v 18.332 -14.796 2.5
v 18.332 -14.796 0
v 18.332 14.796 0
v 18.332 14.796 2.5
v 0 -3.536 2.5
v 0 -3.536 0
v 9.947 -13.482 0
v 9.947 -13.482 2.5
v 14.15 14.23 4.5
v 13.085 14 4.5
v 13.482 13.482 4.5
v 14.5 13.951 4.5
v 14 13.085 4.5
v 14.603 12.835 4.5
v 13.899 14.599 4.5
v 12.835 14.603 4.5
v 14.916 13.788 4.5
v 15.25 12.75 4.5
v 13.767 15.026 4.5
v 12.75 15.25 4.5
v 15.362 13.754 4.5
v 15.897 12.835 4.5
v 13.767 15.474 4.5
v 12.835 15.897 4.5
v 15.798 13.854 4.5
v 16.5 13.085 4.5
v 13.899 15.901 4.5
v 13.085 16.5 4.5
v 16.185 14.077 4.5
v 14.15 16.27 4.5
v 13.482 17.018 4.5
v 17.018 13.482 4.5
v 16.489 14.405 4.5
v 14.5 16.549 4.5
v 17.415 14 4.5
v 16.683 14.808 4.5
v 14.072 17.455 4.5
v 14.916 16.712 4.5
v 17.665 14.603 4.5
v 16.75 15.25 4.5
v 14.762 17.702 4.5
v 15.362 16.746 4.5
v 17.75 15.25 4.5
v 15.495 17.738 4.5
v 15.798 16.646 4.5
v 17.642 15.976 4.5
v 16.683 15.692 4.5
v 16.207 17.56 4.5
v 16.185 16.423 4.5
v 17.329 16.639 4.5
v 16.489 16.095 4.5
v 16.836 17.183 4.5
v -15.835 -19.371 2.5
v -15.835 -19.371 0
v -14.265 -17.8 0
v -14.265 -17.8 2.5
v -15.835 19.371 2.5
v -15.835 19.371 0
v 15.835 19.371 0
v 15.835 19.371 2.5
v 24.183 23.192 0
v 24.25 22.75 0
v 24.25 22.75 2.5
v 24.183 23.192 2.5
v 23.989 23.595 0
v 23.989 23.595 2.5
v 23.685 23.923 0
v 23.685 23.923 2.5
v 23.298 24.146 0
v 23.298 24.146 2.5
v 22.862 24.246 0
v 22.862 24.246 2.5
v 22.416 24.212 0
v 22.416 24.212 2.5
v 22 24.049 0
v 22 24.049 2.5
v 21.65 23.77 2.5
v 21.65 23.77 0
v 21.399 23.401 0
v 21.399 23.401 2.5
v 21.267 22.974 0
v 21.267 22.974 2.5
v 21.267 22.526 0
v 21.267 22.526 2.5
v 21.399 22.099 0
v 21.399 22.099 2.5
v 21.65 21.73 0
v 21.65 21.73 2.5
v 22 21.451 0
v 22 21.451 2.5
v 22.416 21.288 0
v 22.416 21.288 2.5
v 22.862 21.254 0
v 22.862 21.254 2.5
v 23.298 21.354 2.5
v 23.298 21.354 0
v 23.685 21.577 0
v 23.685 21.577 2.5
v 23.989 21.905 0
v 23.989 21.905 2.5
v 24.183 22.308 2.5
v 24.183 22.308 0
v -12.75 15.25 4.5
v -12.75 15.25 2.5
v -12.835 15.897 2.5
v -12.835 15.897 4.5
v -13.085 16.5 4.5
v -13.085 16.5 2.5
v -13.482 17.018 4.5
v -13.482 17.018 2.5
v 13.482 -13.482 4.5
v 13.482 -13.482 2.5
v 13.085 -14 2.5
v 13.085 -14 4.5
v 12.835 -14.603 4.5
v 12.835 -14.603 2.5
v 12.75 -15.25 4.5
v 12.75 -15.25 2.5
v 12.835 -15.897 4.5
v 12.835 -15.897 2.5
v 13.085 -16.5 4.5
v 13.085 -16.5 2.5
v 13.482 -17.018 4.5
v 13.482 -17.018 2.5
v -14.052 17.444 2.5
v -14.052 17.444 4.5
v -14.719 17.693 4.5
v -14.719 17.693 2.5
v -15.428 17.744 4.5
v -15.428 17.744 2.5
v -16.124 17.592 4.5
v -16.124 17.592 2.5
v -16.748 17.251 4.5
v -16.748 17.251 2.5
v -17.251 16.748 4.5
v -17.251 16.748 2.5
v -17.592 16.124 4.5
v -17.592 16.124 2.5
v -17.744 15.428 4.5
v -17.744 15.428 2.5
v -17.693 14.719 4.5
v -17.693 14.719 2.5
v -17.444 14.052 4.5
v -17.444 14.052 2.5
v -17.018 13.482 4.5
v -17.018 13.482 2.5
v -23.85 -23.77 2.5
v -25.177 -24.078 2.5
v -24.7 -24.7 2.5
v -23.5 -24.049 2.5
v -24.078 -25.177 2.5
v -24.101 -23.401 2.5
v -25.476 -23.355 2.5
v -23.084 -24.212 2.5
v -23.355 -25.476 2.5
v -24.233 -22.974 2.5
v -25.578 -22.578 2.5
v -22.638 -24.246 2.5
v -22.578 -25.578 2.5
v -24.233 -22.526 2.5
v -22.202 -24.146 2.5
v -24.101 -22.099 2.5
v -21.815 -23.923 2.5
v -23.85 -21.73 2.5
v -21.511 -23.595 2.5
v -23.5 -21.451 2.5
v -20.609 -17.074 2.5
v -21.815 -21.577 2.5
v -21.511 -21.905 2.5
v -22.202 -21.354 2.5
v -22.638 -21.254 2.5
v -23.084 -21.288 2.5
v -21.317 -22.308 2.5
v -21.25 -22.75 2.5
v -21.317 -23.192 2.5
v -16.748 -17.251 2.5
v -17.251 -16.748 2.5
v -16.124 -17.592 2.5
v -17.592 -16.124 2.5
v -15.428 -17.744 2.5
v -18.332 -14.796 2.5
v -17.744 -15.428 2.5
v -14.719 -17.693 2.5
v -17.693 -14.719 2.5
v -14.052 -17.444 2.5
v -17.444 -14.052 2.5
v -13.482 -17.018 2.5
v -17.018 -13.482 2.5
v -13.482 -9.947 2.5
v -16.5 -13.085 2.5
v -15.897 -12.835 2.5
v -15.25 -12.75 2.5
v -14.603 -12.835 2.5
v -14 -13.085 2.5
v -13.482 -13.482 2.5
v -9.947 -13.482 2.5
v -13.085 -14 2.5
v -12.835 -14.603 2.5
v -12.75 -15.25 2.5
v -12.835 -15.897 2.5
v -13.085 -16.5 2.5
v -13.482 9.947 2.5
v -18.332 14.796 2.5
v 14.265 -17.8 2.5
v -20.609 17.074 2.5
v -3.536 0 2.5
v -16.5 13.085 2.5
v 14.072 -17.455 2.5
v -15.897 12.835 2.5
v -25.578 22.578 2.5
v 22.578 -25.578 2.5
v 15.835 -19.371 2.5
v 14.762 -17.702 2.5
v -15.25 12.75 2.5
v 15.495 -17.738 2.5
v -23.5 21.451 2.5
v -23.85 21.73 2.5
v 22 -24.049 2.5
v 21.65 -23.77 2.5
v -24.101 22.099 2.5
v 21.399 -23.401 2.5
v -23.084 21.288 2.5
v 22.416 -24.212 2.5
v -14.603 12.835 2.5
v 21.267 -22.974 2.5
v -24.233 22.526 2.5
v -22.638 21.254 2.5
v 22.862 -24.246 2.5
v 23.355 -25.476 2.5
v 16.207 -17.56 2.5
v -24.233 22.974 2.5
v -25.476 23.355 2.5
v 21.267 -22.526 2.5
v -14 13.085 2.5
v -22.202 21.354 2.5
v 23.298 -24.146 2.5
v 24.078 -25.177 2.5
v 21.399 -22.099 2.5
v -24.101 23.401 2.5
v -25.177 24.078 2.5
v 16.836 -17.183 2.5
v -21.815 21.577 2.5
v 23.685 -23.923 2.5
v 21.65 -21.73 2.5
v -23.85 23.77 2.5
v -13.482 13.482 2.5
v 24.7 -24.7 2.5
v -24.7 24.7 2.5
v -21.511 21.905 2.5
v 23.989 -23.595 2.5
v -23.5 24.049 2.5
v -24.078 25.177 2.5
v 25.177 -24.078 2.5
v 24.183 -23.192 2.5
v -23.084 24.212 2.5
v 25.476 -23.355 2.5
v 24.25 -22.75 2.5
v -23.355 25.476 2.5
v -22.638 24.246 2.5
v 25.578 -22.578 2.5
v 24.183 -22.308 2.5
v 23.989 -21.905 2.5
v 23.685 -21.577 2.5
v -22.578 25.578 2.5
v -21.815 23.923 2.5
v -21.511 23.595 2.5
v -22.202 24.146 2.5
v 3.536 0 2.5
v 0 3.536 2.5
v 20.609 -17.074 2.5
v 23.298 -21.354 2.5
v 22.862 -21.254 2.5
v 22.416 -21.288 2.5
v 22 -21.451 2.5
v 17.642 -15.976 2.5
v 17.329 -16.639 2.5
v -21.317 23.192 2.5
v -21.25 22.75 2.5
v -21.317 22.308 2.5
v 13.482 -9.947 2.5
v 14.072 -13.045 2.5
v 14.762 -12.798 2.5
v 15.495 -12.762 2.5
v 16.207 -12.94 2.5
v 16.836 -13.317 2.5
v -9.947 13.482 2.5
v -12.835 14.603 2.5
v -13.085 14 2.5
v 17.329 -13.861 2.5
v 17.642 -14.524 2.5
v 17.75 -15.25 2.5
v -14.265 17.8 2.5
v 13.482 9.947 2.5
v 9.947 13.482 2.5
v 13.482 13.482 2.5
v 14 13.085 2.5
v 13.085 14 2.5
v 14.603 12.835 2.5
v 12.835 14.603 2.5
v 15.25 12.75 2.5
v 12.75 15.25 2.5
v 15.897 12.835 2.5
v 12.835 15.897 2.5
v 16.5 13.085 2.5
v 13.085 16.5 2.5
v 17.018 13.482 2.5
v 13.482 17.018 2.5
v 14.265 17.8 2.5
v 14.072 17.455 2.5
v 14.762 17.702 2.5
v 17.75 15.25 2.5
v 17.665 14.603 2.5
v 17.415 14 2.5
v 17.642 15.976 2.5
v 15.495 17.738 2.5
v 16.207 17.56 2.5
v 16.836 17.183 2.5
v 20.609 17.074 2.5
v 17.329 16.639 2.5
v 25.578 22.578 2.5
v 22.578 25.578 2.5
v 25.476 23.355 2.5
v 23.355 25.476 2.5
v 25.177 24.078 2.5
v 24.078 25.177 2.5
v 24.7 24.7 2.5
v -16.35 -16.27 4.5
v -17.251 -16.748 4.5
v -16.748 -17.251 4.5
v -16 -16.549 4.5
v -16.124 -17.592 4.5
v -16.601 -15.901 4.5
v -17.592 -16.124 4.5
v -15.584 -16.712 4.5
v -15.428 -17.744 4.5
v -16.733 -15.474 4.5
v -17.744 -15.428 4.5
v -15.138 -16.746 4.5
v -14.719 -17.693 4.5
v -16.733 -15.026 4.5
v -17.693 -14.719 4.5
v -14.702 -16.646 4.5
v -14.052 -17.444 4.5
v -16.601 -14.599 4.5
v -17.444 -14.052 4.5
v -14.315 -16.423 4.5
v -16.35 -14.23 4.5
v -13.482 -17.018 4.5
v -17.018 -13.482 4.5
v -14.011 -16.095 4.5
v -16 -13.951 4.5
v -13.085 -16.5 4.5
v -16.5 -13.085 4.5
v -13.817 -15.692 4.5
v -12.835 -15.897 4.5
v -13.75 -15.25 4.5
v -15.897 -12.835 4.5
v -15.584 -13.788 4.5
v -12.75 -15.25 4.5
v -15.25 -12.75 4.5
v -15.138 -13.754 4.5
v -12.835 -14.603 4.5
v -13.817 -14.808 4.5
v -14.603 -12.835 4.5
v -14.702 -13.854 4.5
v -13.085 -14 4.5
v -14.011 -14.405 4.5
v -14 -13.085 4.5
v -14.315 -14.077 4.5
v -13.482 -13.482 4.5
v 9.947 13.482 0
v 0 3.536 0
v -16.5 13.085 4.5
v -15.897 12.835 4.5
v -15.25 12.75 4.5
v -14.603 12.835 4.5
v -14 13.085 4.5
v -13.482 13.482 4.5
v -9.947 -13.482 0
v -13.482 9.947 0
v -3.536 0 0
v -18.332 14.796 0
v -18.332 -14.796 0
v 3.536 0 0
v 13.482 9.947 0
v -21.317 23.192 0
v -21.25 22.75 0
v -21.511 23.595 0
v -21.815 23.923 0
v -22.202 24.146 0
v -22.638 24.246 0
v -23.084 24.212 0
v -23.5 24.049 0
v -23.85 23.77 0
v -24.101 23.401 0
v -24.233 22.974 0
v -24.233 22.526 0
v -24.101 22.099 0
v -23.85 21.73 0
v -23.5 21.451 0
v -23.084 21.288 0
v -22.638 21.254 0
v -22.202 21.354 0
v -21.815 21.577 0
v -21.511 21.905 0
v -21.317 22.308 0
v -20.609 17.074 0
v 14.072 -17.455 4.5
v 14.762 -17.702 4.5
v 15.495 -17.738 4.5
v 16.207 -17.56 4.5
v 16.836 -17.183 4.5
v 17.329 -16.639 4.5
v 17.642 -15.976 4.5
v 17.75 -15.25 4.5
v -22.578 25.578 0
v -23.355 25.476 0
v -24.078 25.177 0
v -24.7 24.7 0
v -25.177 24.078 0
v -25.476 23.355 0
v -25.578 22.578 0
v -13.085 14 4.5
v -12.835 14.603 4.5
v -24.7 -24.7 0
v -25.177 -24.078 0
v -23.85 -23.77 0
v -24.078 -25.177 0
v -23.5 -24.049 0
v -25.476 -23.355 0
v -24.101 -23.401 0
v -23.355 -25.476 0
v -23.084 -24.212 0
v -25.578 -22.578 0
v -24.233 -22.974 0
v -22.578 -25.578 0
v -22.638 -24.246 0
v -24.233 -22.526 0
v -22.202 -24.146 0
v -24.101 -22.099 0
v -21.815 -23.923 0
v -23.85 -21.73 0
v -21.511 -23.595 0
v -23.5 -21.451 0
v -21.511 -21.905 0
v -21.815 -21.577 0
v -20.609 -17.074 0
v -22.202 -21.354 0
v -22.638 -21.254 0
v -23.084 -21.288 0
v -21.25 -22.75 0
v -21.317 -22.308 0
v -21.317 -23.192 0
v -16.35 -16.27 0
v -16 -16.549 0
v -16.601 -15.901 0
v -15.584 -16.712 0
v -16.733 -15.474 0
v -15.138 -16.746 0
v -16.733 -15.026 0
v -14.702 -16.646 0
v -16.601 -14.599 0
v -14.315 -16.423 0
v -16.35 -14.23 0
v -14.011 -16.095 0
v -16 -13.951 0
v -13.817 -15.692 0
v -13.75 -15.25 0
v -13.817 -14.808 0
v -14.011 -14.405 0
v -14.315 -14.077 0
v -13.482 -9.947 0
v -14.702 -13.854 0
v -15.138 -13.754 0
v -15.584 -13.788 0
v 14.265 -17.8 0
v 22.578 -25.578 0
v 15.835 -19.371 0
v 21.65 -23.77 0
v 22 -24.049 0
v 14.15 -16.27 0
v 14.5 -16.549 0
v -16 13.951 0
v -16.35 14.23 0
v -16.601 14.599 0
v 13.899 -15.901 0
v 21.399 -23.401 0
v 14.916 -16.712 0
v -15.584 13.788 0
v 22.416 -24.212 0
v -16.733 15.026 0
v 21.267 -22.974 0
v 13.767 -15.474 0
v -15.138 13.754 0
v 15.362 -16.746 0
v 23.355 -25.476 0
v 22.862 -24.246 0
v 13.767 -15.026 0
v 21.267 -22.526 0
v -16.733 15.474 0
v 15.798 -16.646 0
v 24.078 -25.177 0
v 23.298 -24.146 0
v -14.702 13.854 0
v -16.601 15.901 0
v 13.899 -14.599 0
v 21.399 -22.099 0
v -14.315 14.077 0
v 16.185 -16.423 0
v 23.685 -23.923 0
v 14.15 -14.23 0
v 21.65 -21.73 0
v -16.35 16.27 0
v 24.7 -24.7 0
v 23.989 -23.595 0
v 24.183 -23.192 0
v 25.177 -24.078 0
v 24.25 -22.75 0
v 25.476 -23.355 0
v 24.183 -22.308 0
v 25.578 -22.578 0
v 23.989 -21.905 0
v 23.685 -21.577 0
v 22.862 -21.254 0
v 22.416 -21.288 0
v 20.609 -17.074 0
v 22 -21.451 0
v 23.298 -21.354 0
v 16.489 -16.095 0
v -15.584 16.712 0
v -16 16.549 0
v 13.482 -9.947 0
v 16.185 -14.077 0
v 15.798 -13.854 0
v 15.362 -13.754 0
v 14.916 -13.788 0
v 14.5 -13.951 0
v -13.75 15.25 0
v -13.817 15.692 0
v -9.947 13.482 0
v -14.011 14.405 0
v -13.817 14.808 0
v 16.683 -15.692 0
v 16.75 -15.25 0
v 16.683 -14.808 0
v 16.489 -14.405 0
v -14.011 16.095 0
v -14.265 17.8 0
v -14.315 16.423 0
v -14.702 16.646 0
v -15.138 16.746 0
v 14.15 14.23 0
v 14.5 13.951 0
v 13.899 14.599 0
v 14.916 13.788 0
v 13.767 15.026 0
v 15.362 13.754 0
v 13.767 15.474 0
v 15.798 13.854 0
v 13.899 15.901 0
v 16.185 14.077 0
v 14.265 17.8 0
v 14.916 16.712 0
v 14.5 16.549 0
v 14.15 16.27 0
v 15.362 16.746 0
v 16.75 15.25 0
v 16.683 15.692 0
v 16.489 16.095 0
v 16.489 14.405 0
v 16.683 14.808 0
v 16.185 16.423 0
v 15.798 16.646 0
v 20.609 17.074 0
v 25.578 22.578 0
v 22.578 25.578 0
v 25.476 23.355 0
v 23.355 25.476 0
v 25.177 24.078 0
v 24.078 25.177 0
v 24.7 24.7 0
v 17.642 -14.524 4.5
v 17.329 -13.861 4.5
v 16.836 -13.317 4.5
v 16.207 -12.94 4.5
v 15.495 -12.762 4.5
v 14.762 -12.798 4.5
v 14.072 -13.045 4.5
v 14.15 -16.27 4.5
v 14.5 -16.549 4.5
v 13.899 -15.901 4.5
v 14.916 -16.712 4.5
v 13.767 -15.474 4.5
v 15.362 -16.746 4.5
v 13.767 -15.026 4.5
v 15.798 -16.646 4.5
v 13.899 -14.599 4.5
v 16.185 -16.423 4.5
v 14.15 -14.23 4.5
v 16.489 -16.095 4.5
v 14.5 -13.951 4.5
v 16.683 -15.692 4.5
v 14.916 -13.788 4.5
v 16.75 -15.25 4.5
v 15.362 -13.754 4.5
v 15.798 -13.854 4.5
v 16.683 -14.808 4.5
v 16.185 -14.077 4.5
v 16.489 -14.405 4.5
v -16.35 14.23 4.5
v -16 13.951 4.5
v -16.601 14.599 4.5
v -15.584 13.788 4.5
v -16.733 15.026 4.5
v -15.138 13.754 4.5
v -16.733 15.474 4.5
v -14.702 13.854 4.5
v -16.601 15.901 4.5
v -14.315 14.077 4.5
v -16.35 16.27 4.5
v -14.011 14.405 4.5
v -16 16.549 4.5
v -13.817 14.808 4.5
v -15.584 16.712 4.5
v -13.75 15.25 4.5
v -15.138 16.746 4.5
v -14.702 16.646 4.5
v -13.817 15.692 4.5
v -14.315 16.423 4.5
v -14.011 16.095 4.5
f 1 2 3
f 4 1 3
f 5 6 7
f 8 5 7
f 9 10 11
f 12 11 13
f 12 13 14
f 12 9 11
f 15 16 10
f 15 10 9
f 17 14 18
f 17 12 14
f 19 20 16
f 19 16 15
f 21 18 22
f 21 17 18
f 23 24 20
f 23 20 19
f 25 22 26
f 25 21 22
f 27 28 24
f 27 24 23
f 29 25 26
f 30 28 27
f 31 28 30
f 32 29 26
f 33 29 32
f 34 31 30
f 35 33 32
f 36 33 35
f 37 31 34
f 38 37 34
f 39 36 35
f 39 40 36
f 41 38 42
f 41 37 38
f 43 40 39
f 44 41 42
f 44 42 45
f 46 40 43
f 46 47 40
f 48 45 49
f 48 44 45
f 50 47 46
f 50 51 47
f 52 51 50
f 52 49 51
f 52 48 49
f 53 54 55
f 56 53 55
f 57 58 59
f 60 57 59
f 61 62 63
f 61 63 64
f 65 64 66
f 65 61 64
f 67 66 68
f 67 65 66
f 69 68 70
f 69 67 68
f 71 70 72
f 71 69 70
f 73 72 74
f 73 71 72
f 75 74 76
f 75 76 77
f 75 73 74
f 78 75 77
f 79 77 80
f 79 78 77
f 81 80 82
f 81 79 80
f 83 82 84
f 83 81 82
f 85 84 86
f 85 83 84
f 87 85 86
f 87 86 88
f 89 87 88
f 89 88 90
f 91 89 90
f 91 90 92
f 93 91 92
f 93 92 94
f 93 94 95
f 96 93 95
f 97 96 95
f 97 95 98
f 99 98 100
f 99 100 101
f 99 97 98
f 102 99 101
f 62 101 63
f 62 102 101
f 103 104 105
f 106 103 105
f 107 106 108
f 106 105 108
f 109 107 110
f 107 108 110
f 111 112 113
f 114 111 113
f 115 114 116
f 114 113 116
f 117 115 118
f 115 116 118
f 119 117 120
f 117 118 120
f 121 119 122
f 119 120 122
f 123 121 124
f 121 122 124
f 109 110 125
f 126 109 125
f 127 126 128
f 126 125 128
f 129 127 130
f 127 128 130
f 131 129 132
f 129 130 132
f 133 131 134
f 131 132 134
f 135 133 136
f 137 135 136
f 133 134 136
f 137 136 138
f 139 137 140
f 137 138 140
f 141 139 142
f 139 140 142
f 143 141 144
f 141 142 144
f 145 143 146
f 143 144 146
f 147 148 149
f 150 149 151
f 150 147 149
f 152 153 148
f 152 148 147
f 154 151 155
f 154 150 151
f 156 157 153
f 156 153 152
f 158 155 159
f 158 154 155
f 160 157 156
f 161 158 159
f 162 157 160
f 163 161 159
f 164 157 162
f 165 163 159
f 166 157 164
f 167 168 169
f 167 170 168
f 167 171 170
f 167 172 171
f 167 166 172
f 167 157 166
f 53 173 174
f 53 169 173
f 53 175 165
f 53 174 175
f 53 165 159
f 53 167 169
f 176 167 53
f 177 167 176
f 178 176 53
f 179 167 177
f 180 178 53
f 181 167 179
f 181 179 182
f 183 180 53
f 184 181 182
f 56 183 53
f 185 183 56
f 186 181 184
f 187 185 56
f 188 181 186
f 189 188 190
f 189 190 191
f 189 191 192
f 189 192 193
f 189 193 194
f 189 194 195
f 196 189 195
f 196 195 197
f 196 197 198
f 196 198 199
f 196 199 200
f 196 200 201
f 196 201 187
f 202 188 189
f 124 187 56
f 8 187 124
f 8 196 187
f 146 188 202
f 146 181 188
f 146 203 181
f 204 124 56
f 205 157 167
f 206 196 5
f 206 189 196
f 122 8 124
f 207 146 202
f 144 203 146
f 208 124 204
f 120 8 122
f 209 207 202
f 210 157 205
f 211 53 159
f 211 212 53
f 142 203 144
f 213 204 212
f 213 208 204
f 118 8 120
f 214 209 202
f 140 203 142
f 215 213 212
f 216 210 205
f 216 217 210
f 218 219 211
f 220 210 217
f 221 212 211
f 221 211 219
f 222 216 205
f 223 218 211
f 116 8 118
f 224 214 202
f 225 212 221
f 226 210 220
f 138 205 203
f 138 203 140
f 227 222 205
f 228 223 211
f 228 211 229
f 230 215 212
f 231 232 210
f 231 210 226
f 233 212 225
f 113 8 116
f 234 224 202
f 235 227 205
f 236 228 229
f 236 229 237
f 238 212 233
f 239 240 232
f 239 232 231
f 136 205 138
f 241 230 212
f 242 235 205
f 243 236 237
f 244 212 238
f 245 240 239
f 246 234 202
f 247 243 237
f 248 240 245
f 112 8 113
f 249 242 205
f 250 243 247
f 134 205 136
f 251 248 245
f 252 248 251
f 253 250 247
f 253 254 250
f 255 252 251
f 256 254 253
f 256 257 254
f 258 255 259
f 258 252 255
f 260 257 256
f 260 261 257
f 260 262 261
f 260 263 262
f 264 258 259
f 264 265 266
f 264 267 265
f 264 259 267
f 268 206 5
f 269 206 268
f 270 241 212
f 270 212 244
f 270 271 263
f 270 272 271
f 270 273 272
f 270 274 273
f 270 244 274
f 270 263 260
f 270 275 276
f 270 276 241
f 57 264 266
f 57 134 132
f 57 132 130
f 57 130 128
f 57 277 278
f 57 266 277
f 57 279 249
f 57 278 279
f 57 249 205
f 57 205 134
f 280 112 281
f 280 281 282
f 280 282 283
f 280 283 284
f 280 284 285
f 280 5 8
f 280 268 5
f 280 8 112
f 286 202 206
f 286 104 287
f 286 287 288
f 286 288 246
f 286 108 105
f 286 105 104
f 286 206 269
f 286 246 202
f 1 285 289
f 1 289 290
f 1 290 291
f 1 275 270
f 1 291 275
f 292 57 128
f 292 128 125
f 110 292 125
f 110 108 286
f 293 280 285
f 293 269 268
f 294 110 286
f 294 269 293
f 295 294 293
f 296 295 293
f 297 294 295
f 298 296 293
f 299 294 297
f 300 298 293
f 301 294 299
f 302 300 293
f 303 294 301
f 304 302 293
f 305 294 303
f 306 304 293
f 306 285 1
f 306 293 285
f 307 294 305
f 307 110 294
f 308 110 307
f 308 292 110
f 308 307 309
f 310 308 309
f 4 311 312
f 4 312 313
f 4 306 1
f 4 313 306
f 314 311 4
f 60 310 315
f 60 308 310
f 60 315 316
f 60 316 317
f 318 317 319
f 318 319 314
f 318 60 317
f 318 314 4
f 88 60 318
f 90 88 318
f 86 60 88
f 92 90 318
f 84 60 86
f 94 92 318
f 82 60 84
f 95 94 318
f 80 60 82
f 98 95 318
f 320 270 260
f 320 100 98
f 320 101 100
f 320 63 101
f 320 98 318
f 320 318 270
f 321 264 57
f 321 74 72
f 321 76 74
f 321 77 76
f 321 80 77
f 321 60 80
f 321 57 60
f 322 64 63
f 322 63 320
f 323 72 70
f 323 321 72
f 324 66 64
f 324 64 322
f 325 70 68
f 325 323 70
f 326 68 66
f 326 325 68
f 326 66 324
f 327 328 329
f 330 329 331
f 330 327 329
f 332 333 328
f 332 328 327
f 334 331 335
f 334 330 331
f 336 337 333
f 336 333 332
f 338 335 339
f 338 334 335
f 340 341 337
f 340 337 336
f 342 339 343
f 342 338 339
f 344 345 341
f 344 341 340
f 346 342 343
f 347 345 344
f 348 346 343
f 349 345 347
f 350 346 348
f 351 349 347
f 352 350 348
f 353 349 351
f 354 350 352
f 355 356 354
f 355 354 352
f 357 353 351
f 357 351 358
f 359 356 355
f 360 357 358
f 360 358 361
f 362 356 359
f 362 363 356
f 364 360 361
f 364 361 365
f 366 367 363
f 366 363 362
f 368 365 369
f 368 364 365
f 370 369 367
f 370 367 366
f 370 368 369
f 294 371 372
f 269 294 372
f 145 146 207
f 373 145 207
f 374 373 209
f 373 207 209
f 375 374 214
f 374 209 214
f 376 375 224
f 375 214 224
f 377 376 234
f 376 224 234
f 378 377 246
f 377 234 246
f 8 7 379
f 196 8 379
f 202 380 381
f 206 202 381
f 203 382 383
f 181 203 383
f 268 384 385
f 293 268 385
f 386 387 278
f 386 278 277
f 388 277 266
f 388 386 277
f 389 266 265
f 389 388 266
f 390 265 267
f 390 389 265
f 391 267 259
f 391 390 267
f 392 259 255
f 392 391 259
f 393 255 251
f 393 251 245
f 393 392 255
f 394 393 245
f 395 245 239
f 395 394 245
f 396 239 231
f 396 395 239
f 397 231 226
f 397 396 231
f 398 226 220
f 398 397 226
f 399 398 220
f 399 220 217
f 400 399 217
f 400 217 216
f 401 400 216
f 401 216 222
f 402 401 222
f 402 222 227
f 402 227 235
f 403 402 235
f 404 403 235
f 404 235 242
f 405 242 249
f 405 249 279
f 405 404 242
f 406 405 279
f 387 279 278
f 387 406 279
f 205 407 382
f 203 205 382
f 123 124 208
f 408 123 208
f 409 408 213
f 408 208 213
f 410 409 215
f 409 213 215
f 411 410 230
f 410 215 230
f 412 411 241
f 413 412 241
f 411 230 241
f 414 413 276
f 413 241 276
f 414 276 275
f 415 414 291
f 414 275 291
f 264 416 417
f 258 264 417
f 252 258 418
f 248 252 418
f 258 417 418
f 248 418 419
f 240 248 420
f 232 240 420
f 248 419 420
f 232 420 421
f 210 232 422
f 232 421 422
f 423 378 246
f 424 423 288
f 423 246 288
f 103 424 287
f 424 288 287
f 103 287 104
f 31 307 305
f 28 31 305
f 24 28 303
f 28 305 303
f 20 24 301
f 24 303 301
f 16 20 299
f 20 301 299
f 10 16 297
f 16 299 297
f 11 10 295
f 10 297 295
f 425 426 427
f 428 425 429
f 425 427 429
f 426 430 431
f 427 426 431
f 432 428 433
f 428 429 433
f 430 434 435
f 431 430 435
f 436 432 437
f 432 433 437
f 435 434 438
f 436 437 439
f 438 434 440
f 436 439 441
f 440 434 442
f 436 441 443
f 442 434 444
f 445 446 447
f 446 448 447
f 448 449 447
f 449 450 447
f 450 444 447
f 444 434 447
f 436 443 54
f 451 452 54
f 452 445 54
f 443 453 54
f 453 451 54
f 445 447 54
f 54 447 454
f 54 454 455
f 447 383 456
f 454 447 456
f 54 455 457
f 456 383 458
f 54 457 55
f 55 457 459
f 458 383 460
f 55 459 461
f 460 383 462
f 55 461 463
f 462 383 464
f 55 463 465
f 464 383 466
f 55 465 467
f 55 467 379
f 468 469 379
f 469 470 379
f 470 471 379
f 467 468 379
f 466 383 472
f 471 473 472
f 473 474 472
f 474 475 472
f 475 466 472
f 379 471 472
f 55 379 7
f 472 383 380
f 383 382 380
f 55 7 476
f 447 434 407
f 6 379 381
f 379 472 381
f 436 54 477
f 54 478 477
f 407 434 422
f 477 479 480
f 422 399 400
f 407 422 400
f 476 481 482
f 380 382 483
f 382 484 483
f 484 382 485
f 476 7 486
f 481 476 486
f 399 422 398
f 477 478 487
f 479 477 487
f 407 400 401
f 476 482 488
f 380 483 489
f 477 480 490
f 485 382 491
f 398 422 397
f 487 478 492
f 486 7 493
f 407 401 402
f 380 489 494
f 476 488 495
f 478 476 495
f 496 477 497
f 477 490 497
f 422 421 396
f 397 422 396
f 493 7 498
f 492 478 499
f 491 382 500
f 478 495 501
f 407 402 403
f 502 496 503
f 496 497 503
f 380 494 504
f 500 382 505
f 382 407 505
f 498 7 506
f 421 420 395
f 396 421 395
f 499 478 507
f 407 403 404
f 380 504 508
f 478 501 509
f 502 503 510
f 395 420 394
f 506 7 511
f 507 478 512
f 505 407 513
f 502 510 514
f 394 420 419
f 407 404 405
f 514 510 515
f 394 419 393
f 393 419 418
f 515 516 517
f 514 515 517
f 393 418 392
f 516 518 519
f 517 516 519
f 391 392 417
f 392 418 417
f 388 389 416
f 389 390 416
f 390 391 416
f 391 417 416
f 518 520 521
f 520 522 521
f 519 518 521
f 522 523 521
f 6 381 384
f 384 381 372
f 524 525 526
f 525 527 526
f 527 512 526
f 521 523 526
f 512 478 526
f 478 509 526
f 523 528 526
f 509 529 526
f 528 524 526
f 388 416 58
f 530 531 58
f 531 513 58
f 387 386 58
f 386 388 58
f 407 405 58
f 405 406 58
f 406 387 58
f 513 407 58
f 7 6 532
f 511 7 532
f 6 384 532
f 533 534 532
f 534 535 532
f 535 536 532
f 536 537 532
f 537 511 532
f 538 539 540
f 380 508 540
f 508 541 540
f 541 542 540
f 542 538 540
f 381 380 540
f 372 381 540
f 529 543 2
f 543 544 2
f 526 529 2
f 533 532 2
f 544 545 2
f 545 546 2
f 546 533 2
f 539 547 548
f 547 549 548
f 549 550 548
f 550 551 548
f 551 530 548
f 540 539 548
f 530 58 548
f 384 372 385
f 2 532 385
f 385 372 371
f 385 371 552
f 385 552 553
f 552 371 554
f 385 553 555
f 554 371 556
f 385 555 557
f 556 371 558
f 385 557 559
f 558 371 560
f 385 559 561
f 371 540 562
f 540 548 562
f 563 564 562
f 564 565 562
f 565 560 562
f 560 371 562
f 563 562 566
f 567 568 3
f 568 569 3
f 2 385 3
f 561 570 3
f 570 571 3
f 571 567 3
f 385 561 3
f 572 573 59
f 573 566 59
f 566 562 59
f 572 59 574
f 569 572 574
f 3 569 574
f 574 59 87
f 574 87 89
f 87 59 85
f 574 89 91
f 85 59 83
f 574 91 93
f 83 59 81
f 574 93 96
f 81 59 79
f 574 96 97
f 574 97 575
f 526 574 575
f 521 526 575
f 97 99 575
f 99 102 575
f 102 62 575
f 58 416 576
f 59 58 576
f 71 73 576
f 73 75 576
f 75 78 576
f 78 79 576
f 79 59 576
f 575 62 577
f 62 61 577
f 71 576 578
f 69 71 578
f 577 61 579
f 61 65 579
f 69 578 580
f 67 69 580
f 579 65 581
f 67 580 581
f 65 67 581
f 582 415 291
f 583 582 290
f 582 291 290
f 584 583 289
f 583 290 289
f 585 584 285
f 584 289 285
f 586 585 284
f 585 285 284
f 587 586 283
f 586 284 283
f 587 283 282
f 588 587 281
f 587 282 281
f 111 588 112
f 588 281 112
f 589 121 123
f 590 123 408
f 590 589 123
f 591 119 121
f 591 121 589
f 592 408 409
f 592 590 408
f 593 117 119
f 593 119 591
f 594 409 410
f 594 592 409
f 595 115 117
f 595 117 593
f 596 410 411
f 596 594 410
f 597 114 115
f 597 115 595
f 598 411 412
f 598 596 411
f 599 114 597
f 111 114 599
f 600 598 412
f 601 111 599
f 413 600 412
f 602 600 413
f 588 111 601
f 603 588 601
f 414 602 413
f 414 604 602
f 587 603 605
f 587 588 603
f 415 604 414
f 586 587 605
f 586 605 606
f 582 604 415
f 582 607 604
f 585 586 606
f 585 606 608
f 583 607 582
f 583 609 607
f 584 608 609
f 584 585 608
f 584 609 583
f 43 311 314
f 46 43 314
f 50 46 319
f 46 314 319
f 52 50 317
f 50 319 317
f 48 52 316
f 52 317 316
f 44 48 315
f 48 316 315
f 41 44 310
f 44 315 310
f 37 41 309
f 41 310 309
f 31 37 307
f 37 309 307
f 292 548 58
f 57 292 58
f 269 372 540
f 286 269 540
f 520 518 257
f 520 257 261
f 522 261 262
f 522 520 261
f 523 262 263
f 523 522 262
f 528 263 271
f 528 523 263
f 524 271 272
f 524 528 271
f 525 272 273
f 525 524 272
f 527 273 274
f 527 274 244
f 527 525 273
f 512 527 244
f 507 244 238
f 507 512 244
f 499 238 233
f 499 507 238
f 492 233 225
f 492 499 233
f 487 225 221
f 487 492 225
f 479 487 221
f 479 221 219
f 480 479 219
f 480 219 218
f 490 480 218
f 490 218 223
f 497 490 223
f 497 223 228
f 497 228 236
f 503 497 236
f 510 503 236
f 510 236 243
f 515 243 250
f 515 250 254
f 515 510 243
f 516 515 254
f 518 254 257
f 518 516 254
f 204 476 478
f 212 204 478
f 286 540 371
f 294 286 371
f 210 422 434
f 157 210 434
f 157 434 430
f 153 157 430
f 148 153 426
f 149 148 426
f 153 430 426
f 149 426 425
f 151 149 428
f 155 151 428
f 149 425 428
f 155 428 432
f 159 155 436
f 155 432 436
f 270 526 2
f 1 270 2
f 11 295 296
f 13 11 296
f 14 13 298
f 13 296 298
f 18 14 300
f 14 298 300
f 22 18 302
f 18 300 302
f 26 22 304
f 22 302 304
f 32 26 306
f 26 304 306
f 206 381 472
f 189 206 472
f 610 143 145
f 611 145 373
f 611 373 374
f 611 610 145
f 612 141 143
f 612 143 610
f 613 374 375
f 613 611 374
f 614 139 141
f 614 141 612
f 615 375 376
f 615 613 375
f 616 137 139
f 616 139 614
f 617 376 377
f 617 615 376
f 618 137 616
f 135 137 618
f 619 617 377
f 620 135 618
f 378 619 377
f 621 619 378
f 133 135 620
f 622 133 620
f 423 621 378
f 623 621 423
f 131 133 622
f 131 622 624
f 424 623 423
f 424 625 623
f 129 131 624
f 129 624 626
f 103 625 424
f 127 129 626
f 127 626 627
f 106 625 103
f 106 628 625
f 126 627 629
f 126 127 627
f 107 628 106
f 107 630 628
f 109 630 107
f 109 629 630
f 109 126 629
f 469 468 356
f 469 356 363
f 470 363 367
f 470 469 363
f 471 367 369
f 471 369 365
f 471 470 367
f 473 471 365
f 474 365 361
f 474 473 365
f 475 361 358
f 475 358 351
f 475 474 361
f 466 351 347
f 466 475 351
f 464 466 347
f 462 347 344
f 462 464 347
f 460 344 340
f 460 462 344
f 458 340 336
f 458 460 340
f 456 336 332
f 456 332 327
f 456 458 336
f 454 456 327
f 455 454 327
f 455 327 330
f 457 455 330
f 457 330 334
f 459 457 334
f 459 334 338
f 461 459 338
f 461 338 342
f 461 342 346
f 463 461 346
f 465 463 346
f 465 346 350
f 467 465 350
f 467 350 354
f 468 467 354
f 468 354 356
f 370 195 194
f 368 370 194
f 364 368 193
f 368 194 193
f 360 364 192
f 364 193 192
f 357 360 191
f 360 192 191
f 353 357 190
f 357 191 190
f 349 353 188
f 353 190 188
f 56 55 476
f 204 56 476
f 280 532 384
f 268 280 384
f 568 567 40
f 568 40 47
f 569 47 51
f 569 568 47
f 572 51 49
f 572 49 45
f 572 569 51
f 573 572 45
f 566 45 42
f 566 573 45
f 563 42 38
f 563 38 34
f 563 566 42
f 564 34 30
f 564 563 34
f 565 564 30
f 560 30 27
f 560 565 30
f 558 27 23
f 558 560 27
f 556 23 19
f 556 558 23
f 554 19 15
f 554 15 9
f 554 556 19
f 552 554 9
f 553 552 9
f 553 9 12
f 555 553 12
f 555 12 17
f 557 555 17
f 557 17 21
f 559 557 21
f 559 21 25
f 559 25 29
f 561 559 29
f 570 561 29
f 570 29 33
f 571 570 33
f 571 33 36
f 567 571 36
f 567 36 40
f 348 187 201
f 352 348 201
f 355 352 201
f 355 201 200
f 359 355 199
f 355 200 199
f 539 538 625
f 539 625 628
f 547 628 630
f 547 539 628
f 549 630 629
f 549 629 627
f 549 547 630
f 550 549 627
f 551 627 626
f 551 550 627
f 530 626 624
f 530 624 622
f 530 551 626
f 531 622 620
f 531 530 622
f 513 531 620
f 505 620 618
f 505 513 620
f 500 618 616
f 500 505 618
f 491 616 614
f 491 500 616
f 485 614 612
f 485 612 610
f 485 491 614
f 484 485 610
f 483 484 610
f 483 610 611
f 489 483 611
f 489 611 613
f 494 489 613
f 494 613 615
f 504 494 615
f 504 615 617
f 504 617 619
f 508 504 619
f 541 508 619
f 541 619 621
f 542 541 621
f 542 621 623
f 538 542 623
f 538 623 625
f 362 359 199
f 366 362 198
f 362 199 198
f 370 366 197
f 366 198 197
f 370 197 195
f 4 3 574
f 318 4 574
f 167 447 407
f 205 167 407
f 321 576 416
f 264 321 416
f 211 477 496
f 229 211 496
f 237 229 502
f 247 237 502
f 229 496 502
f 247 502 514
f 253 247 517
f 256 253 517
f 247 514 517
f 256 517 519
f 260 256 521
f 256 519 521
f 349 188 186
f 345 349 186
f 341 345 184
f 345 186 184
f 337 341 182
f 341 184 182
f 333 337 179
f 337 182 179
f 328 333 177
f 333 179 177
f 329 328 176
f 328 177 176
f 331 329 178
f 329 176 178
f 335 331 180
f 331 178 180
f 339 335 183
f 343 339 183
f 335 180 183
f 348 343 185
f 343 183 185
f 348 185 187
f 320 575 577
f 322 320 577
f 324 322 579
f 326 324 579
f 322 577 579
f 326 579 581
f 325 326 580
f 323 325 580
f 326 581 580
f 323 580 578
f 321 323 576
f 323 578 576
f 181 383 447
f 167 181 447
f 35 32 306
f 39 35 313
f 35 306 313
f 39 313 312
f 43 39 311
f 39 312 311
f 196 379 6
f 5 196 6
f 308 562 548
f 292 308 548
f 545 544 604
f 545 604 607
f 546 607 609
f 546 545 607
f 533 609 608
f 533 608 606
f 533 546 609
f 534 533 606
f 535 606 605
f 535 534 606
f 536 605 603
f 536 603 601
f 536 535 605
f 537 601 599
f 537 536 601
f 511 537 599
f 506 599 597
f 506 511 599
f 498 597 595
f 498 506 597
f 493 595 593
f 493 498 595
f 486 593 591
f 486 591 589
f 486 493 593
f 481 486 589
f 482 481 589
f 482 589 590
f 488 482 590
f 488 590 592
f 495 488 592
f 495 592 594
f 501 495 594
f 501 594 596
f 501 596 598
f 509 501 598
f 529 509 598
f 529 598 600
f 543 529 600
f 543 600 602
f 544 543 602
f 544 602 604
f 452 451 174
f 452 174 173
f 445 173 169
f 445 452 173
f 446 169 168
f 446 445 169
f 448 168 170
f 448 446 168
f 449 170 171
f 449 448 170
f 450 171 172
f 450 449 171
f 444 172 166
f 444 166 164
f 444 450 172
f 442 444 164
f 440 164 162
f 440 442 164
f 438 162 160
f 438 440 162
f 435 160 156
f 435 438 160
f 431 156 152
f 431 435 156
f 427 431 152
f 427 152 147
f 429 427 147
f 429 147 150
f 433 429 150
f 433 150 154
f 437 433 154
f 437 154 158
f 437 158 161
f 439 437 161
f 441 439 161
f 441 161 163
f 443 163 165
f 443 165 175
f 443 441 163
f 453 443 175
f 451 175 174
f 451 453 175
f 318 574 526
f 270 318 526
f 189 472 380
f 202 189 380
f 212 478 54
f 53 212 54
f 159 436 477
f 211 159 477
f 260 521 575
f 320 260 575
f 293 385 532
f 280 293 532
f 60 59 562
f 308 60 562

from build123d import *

# Parameters (mm, degrees)
F0_R     = 1.5
F1_DEPTH = 2.5
F2_DEPTH = 4.5


with BuildPart() as f1:
    # F0 (on Top) → F1 (new body)
    with BuildSketch(Plane.XY):
        with BuildLine():
            Line((22.5784271247, 25.5784271247), (-22.5784271247, 25.5784271247))
            ThreePointArc((-22.5784271247, 25.5784271247), (-24.6997474683, 24.6997474683), (-25.5784271247, 22.5784271247))
            Line((-25.5784271247, 22.5784271247), (-25.5784271247, -22.5784271247))
            ThreePointArc((-25.5784271247, -22.5784271247), (-24.6997474683, -24.6997474683), (-22.5784271247, -25.5784271247))
            Line((-22.5784271247, -25.5784271247), (22.5784271247, -25.5784271247))
            ThreePointArc((22.5784271247, -25.5784271247), (24.6997474683, -24.6997474683), (25.5784271247, -22.5784271247))
            Line((25.5784271247, -22.5784271247), (25.5784271247, 22.5784271247))
            ThreePointArc((25.5784271247, 22.5784271247), (24.6997474683, 24.6997474683), (22.5784271247, 25.5784271247))
        make_face()
        with Locations((-22.75, -22.75)):
            Circle(F0_R, mode=Mode.SUBTRACT)
        with Locations((22.75, -22.75)):
            Circle(F0_R, mode=Mode.SUBTRACT)
        Polygon((20.609353269, 17.0738193631), (20.609353269, -17.0738193631), (20.609353269, -19.3710013949), (15.835467489, -19.3710013949), (-15.835467489, -19.3710013949), (-20.609353269, -19.3710013949), (-20.609353269, -17.0738193631), (-20.609353269, 17.0738193631), (-20.609353269, 19.3710013949), (-15.835467489, 19.3710013949), (15.835467489, 19.3710013949), (20.609353269, 19.3710013949), align=None, mode=Mode.SUBTRACT)
        with Locations((-22.75, 22.75)):
            Circle(F0_R, mode=Mode.SUBTRACT)
        with Locations((22.75, 22.75)):
            Circle(F0_R, mode=Mode.SUBTRACT)
        Polygon((13.482233047, 9.9466991411), (13.482233047, -9.9466991411), (17.0177669094, -13.4822330035), (18.3316272948, -14.7960933889), (18.3316272948, 14.7960933889), (17.017766953, 13.482233047), align=None)
        Polygon((-17.0177669365, -13.4822330306), (-13.482233047, -9.9466991411), (-13.482233047, 9.9466991411), (-17.0177669469, 13.482233041), (-18.3316272948, 14.7960933889), (-18.3316272948, -14.7960933889), align=None)
        Polygon((-9.9466991411, 13.482233047), (9.9466991411, 13.482233047), (13.482233047, 17.017766953), (14.2646765199, 17.8002104258), (-14.2646765199, 17.8002104258), (-13.482233047, 17.017766953), align=None)
        Polygon((13.4822330479, -17.0177669538), (9.9466991411, -13.482233047), (-9.9466991411, -13.482233047), (-13.4822330382, -17.0177669441), (-14.2646765199, -17.8002104258), (14.2646765199, -17.8002104258), align=None)
        Polygon((-13.482233047, 9.9466991411), (-3.5355339059, 0), (0, 3.5355339059), (-9.9466991411, 13.482233047), (-13.482233047, 13.482233047), align=None)
        Polygon((9.9466991411, -13.482233047), (13.482233047, -13.482233047), (13.482233047, -9.9466991411), (3.5355339059, 0), (0, -3.5355339059), align=None)
        Polygon((3.5355339059, 0), (13.482233047, 9.9466991411), (13.482233047, 13.482233047), (9.9466991411, 13.482233047), (0, 3.5355339059), align=None)
        Polygon((-13.482233047, -13.482233047), (-9.9466991411, -13.482233047), (0, -3.5355339059), (-3.5355339059, 0), (-13.482233047, -9.9466991411), align=None)
        Polygon((-3.5355339059, 0), (0, -3.5355339059), (3.5355339059, 0), (0, 3.5355339059), align=None)
        with BuildLine():
            ThreePointArc((-17.0177669469, 13.482233041), (-15.2499999957, 12.75), (-13.482233047, 13.482233047))
            ThreePointArc((-13.482233047, 13.482233047), (-12.9403011687, 14.2932914191), (-12.75, 15.25))
            ThreePointArc((-12.75, 15.25), (-12.9403011687, 16.2067085809), (-13.482233047, 17.017766953))
            ThreePointArc((-13.482233047, 17.017766953), (-17.017766956, 17.01776695), (-17.0177669469, 13.482233041))
        make_face()
        with Locations((-15.25, 15.25)):
            Circle(F0_R, mode=Mode.SUBTRACT)
        with BuildLine():
            ThreePointArc((13.482233047, 17.017766953), (12.75, 15.25), (13.482233047, 13.482233047))
            ThreePointArc((13.482233047, 13.482233047), (15.25, 12.75), (17.017766953, 13.482233047))
            ThreePointArc((17.017766953, 13.482233047), (17.5596988313, 14.2932914191), (17.75, 15.25))
            ThreePointArc((17.75, 15.25), (16.2067085809, 17.5596988313), (13.482233047, 17.017766953))
        make_face()
        with Locations((15.25, 15.25)):
            Circle(F0_R, mode=Mode.SUBTRACT)
        with BuildLine():
            ThreePointArc((17.0177669094, -13.4822330035), (15.2499999692, -12.75), (13.482233047, -13.482233047))
            ThreePointArc((13.482233047, -13.482233047), (12.75, -15.2500000006), (13.4822330479, -17.0177669538))
            ThreePointArc((13.4822330479, -17.0177669538), (16.2067085815, -17.559698831), (17.75, -15.25))
            ThreePointArc((17.75, -15.25), (17.5596988195, -14.2932913907), (17.0177669094, -13.4822330035))
        make_face()
        with Locations((15.25, -15.25)):
            Circle(F0_R, mode=Mode.SUBTRACT)
        with BuildLine():
            ThreePointArc((-12.75, -15.25), (-12.9403011687, -14.2932914191), (-13.482233047, -13.482233047))
            ThreePointArc((-13.482233047, -13.482233047), (-15.2499999884, -12.75), (-17.0177669365, -13.4822330306))
            ThreePointArc((-17.0177669365, -13.4822330306), (-17.0177669568, -17.0177669492), (-13.4822330382, -17.0177669441))
            ThreePointArc((-13.4822330382, -17.0177669441), (-12.9403011663, -16.2067085751), (-12.75, -15.25))
        make_face()
        with Locations((-15.25, -15.25)):
            Circle(F0_R, mode=Mode.SUBTRACT)
        Polygon((-20.609353269, 17.0738193631), (-18.3316272948, 14.7960933889), (-18.3316272948, 17.8002104258), (-14.2646765199, 17.8002104258), (-15.835467489, 19.3710013949), (-20.609353269, 19.3710013949), align=None)
        Polygon((18.3316272948, 17.8002104258), (18.3316272948, 14.7960933889), (20.609353269, 17.0738193631), (20.609353269, 19.3710013949), (15.835467489, 19.3710013949), (14.2646765199, 17.8002104258), align=None)
        Polygon((-15.835467489, -19.3710013949), (-14.2646765199, -17.8002104258), (-18.3316272948, -17.8002104258), (-18.3316272948, -14.7960933889), (-20.609353269, -17.0738193631), (-20.609353269, -19.3710013949), align=None)
        Polygon((20.609353269, -17.0738193631), (18.3316272948, -14.7960933889), (18.3316272948, -17.8002104258), (14.2646765199, -17.8002104258), (15.835467489, -19.3710013949), (20.609353269, -19.3710013949), align=None)
        with BuildLine():
            Line((-13.482233047, 13.482233047), (-9.9466991411, 13.482233047))
            Line((-9.9466991411, 13.482233047), (-13.482233047, 17.017766953))
            ThreePointArc((-13.482233047, 17.017766953), (-12.9403011687, 16.2067085809), (-12.75, 15.25))
            ThreePointArc((-12.75, 15.25), (-12.9403011687, 14.2932914191), (-13.482233047, 13.482233047))
        make_face()
        with BuildLine():
            Line((-17.0177669469, 13.482233041), (-13.482233047, 9.9466991411))
            Line((-13.482233047, 9.9466991411), (-13.482233047, 13.482233047))
            ThreePointArc((-13.482233047, 13.482233047), (-15.2499999957, 12.75), (-17.0177669469, 13.482233041))
        make_face()
        with BuildLine():
            Line((9.9466991411, 13.482233047), (13.482233047, 13.482233047))
            ThreePointArc((13.482233047, 13.482233047), (12.75, 15.25), (13.482233047, 17.017766953))
            Line((13.482233047, 17.017766953), (9.9466991411, 13.482233047))
        make_face()
        with BuildLine():
            Line((13.482233047, 13.482233047), (13.482233047, 9.9466991411))
            Line((13.482233047, 9.9466991411), (17.017766953, 13.482233047))
            ThreePointArc((17.017766953, 13.482233047), (15.25, 12.75), (13.482233047, 13.482233047))
        make_face()
        with BuildLine():
            Line((13.482233047, -9.9466991411), (13.482233047, -13.482233047))
            ThreePointArc((13.482233047, -13.482233047), (15.2499999692, -12.75), (17.0177669094, -13.4822330035))
            Line((17.0177669094, -13.4822330035), (13.482233047, -9.9466991411))
        make_face()
        with BuildLine():
            ThreePointArc((13.4822330479, -17.0177669538), (12.75, -15.2500000006), (13.482233047, -13.482233047))
            Line((13.482233047, -13.482233047), (9.9466991411, -13.482233047))
            Line((9.9466991411, -13.482233047), (13.4822330479, -17.0177669538))
        make_face()
        with BuildLine():
            Line((-13.4822330382, -17.0177669441), (-9.9466991411, -13.482233047))
            Line((-9.9466991411, -13.482233047), (-13.482233047, -13.482233047))
            ThreePointArc((-13.482233047, -13.482233047), (-12.9403011687, -14.2932914191), (-12.75, -15.25))
            ThreePointArc((-12.75, -15.25), (-12.9403011663, -16.2067085751), (-13.4822330382, -17.0177669441))
        make_face()
        with BuildLine():
            ThreePointArc((-17.0177669365, -13.4822330306), (-15.2499999884, -12.75), (-13.482233047, -13.482233047))
            Line((-13.482233047, -13.482233047), (-13.482233047, -9.9466991411))
            Line((-13.482233047, -9.9466991411), (-17.0177669365, -13.4822330306))
        make_face()
        with BuildLine():
            Line((-18.3316272948, 14.7960933889), (-17.0177669469, 13.482233041))
            ThreePointArc((-17.0177669469, 13.482233041), (-17.017766956, 17.01776695), (-13.482233047, 17.017766953))
            Line((-13.482233047, 17.017766953), (-14.2646765199, 17.8002104258))
            Line((-14.2646765199, 17.8002104258), (-18.3316272948, 17.8002104258))
            Line((-18.3316272948, 17.8002104258), (-18.3316272948, 14.7960933889))
        make_face()
        with BuildLine():
            ThreePointArc((17.75, 15.25), (17.5596988313, 14.2932914191), (17.017766953, 13.482233047))
            Line((17.017766953, 13.482233047), (18.3316272948, 14.7960933889))
            Line((18.3316272948, 14.7960933889), (18.3316272948, 17.8002104258))
            Line((18.3316272948, 17.8002104258), (14.2646765199, 17.8002104258))
            Line((14.2646765199, 17.8002104258), (13.482233047, 17.017766953))
            ThreePointArc((13.482233047, 17.017766953), (16.2067085809, 17.5596988313), (17.75, 15.25))
        make_face()
        with BuildLine():
            Line((18.3316272948, -14.7960933889), (17.0177669094, -13.4822330035))
            ThreePointArc((17.0177669094, -13.4822330035), (17.5596988195, -14.2932913907), (17.75, -15.25))
            ThreePointArc((17.75, -15.25), (16.2067085815, -17.559698831), (13.4822330479, -17.0177669538))
            Line((13.4822330479, -17.0177669538), (14.2646765199, -17.8002104258))
            Line((14.2646765199, -17.8002104258), (18.3316272948, -17.8002104258))
            Line((18.3316272948, -17.8002104258), (18.3316272948, -14.7960933889))
        make_face()
        with BuildLine():
            Line((-14.2646765199, -17.8002104258), (-13.4822330382, -17.0177669441))
            ThreePointArc((-13.4822330382, -17.0177669441), (-17.0177669568, -17.0177669492), (-17.0177669365, -13.4822330306))
            Line((-17.0177669365, -13.4822330306), (-18.3316272948, -14.7960933889))
            Line((-18.3316272948, -14.7960933889), (-18.3316272948, -17.8002104258))
            Line((-18.3316272948, -17.8002104258), (-14.2646765199, -17.8002104258))
        make_face()
    extrude(amount=F1_DEPTH)

    # F0 (on Top) → F2 (join)
    with BuildSketch(Plane.XY):
        with BuildLine():
            ThreePointArc((-12.75, -15.25), (-12.9403011687, -14.2932914191), (-13.482233047, -13.482233047))
            ThreePointArc((-13.482233047, -13.482233047), (-15.2499999884, -12.75), (-17.0177669365, -13.4822330306))
            ThreePointArc((-17.0177669365, -13.4822330306), (-17.0177669568, -17.0177669492), (-13.4822330382, -17.0177669441))
            ThreePointArc((-13.4822330382, -17.0177669441), (-12.9403011663, -16.2067085751), (-12.75, -15.25))
        make_face()
        with Locations((-15.25, -15.25)):
            Circle(F0_R, mode=Mode.SUBTRACT)
        with BuildLine():
            ThreePointArc((-17.0177669469, 13.482233041), (-15.2499999957, 12.75), (-13.482233047, 13.482233047))
            ThreePointArc((-13.482233047, 13.482233047), (-12.9403011687, 14.2932914191), (-12.75, 15.25))
            ThreePointArc((-12.75, 15.25), (-12.9403011687, 16.2067085809), (-13.482233047, 17.017766953))
            ThreePointArc((-13.482233047, 17.017766953), (-17.017766956, 17.01776695), (-17.0177669469, 13.482233041))
        make_face()
        with Locations((-15.25, 15.25)):
            Circle(F0_R, mode=Mode.SUBTRACT)
        with BuildLine():
            ThreePointArc((17.0177669094, -13.4822330035), (15.2499999692, -12.75), (13.482233047, -13.482233047))
            ThreePointArc((13.482233047, -13.482233047), (12.75, -15.2500000006), (13.4822330479, -17.0177669538))
            ThreePointArc((13.4822330479, -17.0177669538), (16.2067085815, -17.559698831), (17.75, -15.25))
            ThreePointArc((17.75, -15.25), (17.5596988195, -14.2932913907), (17.0177669094, -13.4822330035))
        make_face()
        with Locations((15.25, -15.25)):
            Circle(F0_R, mode=Mode.SUBTRACT)
        with BuildLine():
            ThreePointArc((13.482233047, 17.017766953), (12.75, 15.25), (13.482233047, 13.482233047))
            ThreePointArc((13.482233047, 13.482233047), (15.25, 12.75), (17.017766953, 13.482233047))
            ThreePointArc((17.017766953, 13.482233047), (17.5596988313, 14.2932914191), (17.75, 15.25))
            ThreePointArc((17.75, 15.25), (16.2067085809, 17.5596988313), (13.482233047, 17.017766953))
        make_face()
        with Locations((15.25, 15.25)):
            Circle(F0_R, mode=Mode.SUBTRACT)
    extrude(amount=F2_DEPTH)


solid = f1.part
